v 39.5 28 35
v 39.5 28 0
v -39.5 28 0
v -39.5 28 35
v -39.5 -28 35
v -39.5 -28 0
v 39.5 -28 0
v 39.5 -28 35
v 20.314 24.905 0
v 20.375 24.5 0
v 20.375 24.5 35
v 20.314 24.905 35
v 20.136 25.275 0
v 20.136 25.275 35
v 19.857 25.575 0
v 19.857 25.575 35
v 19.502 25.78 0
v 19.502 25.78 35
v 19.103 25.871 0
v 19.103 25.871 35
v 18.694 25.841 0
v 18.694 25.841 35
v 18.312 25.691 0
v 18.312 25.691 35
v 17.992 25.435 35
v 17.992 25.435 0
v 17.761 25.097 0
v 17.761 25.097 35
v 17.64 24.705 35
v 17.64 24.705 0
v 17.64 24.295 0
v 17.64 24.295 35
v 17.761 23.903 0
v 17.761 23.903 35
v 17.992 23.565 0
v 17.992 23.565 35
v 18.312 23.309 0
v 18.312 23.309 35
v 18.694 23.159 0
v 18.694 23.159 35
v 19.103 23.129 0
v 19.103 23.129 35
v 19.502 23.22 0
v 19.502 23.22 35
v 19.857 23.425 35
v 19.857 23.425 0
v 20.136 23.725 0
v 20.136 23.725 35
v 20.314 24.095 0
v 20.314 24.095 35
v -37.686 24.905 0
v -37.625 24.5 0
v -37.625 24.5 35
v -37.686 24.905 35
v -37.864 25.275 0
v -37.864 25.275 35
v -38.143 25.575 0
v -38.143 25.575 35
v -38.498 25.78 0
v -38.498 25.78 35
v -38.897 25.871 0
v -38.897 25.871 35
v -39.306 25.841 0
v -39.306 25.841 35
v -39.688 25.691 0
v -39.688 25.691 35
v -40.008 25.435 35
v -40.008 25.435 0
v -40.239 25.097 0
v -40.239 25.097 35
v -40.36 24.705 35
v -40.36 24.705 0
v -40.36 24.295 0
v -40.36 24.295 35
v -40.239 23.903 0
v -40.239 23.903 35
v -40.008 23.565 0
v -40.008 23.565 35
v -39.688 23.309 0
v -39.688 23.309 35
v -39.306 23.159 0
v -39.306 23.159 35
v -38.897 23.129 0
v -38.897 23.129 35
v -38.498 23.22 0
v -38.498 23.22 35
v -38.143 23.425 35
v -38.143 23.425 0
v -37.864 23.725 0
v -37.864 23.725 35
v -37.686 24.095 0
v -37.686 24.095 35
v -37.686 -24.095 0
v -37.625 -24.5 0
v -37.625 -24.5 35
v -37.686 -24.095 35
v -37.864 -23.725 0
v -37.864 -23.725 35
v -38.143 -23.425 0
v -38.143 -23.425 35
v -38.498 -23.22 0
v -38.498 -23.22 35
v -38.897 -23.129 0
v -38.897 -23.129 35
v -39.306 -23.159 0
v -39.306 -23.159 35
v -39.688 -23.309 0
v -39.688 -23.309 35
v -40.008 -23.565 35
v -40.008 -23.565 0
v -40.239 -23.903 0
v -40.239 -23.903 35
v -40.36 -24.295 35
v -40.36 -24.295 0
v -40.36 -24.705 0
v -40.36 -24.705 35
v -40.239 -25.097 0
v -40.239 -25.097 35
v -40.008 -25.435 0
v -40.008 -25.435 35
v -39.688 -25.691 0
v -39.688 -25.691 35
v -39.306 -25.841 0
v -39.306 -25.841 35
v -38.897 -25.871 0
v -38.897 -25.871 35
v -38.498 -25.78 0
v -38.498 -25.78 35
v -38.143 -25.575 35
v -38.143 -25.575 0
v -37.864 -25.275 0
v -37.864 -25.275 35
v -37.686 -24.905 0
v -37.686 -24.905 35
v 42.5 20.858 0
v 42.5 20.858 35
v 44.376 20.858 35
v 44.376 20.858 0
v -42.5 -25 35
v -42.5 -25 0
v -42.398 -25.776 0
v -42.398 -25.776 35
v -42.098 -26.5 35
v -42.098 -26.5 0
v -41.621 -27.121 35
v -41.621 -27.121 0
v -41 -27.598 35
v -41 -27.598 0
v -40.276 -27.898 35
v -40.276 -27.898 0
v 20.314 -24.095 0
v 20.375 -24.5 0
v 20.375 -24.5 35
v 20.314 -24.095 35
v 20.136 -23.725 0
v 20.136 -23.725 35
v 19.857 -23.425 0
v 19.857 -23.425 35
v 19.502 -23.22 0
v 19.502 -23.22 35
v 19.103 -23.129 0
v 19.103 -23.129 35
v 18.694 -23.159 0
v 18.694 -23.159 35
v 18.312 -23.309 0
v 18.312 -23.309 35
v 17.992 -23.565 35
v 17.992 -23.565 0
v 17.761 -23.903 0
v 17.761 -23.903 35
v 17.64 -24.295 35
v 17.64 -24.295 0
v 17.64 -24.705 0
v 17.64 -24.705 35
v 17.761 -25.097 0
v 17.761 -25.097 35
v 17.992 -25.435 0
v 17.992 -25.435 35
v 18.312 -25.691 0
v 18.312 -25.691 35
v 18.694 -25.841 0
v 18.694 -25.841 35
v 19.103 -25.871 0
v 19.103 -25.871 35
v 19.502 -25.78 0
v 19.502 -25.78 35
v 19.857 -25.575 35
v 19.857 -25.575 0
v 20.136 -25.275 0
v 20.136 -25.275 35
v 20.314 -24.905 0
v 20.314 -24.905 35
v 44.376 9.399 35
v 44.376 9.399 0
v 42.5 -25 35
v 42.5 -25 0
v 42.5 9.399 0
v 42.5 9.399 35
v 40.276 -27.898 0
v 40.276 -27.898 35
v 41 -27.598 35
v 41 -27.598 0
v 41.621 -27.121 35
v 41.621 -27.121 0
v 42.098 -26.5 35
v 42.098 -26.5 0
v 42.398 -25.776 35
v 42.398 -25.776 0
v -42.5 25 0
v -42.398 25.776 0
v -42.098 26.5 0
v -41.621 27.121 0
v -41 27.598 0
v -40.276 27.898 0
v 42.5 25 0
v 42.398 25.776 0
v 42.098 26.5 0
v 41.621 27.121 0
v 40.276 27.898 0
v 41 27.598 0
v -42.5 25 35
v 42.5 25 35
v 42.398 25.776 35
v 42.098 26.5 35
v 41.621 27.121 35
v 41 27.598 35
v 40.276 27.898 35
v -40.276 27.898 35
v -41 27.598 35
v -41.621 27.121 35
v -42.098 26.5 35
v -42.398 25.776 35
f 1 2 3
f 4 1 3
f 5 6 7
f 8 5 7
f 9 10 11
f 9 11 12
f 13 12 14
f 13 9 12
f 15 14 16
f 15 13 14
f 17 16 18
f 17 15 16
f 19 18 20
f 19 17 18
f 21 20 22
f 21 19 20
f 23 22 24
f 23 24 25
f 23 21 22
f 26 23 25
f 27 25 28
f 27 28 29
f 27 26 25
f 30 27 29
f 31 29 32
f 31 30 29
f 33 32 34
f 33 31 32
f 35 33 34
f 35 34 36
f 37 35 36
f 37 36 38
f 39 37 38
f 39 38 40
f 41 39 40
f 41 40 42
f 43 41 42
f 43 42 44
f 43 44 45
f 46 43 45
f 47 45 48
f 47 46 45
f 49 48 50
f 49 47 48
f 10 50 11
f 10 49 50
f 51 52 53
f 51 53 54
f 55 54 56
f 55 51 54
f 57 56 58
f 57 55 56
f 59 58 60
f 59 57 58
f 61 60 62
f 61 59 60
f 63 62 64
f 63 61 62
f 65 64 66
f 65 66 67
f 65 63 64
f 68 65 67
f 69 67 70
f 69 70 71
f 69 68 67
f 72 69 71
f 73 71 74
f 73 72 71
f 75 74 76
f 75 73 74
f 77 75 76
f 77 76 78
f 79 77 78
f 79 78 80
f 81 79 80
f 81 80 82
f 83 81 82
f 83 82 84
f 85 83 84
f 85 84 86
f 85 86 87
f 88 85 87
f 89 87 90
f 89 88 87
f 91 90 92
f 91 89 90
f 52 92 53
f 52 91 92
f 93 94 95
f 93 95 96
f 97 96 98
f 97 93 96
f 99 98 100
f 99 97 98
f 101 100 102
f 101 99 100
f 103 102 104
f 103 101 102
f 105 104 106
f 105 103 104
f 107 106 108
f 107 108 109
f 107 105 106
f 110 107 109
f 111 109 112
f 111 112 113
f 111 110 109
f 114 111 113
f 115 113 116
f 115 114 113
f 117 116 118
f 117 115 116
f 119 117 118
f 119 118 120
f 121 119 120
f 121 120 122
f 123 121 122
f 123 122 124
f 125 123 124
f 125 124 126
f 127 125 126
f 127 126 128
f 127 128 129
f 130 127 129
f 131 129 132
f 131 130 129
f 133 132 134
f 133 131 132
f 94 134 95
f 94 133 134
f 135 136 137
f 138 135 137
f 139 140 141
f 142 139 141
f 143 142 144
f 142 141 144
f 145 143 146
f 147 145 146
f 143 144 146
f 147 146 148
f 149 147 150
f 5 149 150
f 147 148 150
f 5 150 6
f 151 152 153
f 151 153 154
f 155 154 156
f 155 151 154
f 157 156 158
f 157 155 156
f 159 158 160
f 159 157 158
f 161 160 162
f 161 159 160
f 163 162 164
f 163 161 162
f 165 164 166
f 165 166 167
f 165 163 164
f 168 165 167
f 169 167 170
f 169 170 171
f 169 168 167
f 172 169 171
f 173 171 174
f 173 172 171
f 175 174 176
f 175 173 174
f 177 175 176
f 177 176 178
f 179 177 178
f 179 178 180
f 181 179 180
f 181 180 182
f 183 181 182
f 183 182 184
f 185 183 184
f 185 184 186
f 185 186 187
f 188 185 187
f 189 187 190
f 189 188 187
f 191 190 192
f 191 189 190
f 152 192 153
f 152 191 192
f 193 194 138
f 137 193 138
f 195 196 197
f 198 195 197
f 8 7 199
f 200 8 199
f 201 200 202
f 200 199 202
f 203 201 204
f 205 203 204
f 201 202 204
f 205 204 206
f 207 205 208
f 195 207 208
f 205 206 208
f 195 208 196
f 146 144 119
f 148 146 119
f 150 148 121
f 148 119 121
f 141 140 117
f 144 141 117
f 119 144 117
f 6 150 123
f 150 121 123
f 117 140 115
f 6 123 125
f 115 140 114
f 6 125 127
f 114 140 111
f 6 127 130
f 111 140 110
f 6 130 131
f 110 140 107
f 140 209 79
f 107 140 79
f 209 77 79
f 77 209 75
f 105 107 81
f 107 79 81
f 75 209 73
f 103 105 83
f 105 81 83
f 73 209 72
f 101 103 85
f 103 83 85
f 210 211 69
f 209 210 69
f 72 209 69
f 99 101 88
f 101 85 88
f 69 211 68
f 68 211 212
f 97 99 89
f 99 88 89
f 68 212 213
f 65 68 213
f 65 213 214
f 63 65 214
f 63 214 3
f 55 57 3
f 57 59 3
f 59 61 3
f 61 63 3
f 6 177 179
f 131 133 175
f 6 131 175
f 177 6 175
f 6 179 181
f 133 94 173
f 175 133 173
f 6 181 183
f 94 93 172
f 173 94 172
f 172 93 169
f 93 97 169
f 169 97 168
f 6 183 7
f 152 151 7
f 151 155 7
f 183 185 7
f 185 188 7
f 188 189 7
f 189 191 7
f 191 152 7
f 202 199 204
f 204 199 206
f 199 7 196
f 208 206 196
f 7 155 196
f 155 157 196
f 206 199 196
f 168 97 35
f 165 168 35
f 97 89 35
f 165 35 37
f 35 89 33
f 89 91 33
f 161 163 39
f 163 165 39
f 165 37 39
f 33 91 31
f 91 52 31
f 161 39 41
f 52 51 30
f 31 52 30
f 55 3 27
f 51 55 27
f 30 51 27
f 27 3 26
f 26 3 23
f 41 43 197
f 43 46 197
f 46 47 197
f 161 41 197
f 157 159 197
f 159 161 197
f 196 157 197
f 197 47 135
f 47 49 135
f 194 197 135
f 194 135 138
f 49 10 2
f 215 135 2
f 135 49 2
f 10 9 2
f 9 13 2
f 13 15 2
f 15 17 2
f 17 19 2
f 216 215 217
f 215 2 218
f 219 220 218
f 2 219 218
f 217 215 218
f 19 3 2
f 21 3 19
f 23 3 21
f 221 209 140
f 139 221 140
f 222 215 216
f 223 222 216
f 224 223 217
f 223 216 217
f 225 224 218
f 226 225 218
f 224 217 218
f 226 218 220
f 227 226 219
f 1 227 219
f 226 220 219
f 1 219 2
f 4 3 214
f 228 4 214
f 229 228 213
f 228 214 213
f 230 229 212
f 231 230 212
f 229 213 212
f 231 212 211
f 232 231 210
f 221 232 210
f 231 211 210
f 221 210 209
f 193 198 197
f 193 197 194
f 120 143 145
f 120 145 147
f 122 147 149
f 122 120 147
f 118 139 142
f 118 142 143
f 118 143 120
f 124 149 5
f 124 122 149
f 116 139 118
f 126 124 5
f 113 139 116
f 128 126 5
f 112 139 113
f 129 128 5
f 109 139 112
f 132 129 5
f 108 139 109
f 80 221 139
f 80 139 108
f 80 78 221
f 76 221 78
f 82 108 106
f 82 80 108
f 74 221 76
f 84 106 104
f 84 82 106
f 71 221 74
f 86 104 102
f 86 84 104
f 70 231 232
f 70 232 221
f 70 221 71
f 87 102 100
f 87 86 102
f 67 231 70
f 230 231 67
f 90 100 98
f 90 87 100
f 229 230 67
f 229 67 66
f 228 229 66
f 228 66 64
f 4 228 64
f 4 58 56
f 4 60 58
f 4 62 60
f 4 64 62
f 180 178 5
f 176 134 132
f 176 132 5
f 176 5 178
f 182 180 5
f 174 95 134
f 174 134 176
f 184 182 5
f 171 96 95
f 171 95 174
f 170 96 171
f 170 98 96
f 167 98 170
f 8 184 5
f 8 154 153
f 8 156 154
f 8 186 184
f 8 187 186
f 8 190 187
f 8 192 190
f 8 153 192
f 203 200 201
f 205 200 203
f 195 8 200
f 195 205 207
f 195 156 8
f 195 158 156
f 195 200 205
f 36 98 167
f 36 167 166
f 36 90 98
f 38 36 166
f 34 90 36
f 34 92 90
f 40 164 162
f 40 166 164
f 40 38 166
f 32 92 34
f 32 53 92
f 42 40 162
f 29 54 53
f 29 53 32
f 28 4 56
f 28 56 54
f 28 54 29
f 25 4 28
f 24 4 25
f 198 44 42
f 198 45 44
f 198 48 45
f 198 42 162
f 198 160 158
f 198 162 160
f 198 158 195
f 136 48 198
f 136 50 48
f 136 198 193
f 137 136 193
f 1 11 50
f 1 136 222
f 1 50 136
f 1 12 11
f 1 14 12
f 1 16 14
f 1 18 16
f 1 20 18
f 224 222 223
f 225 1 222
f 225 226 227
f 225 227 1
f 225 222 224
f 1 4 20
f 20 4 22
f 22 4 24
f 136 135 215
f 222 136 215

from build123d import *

# Parameters (mm, degrees)
SKETCH1_R           = 1.375
SKETCH1_W           = 53.678190842
SKETCH1_H           = 4.106512076
SKETCH1_W_2         = 1.875741611
SKETCH1_H_2         = 11.459220881
SKETCH1_W_3         = 17.06705209
BOSS_EXTRUDE1_DEPTH = 35


with BuildPart() as part:
    # Sketch1 → Boss-Extrude1 (new body)
    with BuildSketch(Plane.XY):
        with BuildLine():
            Line((39.5, 28), (-39.5, 28))
            ThreePointArc((-39.5, 28), (-41.621320344, 27.121320344), (-42.5, 25))
            Line((-42.5, 25), (-42.5, -25))
            ThreePointArc((-42.5, -25), (-41.621320344, -27.121320344), (-39.5, -28))
            Line((-39.5, -28), (39.5, -28))
            ThreePointArc((39.5, -28), (41.621320344, -27.121320344), (42.5, -25))
            Line((42.5, -25), (42.5, 9.398790598))
            Line((42.5, 9.398790598), (25.43294791, 9.398790598))
            Line((25.43294791, 9.398790598), (25.43294791, 20.858011479))
            Line((25.43294791, 20.858011479), (42.5, 20.858011479))
            Line((42.5, 20.858011479), (42.5, 25))
            ThreePointArc((42.5, 25), (41.621320344, 27.121320344), (39.5, 28))
        make_face()
        with Locations((-39, -24.5)):
            Circle(SKETCH1_R, mode=Mode.SUBTRACT)
        with Locations((19, -24.5)):
            Circle(SKETCH1_R, mode=Mode.SUBTRACT)
        with Locations((-39, 24.5)):
            Circle(SKETCH1_R, mode=Mode.SUBTRACT)
        with Locations((-10.129653796, 24.707102416)):
            Rectangle(SKETCH1_W, SKETCH1_H, mode=Mode.SUBTRACT)
        with Locations((19, 24.5)):
            Circle(SKETCH1_R, mode=Mode.SUBTRACT)
        with Locations((-10.129653796, 24.707102416)):
            Rectangle(SKETCH1_W, SKETCH1_H)
        with Locations((43.437870805, 15.128401039)):
            Rectangle(SKETCH1_W_2, SKETCH1_H_2)
        with Locations((33.966473955, 15.128401039)):
            Rectangle(SKETCH1_W_3, SKETCH1_H_2)
    extrude(amount=BOSS_EXTRUDE1_DEPTH)


solid = part.part
